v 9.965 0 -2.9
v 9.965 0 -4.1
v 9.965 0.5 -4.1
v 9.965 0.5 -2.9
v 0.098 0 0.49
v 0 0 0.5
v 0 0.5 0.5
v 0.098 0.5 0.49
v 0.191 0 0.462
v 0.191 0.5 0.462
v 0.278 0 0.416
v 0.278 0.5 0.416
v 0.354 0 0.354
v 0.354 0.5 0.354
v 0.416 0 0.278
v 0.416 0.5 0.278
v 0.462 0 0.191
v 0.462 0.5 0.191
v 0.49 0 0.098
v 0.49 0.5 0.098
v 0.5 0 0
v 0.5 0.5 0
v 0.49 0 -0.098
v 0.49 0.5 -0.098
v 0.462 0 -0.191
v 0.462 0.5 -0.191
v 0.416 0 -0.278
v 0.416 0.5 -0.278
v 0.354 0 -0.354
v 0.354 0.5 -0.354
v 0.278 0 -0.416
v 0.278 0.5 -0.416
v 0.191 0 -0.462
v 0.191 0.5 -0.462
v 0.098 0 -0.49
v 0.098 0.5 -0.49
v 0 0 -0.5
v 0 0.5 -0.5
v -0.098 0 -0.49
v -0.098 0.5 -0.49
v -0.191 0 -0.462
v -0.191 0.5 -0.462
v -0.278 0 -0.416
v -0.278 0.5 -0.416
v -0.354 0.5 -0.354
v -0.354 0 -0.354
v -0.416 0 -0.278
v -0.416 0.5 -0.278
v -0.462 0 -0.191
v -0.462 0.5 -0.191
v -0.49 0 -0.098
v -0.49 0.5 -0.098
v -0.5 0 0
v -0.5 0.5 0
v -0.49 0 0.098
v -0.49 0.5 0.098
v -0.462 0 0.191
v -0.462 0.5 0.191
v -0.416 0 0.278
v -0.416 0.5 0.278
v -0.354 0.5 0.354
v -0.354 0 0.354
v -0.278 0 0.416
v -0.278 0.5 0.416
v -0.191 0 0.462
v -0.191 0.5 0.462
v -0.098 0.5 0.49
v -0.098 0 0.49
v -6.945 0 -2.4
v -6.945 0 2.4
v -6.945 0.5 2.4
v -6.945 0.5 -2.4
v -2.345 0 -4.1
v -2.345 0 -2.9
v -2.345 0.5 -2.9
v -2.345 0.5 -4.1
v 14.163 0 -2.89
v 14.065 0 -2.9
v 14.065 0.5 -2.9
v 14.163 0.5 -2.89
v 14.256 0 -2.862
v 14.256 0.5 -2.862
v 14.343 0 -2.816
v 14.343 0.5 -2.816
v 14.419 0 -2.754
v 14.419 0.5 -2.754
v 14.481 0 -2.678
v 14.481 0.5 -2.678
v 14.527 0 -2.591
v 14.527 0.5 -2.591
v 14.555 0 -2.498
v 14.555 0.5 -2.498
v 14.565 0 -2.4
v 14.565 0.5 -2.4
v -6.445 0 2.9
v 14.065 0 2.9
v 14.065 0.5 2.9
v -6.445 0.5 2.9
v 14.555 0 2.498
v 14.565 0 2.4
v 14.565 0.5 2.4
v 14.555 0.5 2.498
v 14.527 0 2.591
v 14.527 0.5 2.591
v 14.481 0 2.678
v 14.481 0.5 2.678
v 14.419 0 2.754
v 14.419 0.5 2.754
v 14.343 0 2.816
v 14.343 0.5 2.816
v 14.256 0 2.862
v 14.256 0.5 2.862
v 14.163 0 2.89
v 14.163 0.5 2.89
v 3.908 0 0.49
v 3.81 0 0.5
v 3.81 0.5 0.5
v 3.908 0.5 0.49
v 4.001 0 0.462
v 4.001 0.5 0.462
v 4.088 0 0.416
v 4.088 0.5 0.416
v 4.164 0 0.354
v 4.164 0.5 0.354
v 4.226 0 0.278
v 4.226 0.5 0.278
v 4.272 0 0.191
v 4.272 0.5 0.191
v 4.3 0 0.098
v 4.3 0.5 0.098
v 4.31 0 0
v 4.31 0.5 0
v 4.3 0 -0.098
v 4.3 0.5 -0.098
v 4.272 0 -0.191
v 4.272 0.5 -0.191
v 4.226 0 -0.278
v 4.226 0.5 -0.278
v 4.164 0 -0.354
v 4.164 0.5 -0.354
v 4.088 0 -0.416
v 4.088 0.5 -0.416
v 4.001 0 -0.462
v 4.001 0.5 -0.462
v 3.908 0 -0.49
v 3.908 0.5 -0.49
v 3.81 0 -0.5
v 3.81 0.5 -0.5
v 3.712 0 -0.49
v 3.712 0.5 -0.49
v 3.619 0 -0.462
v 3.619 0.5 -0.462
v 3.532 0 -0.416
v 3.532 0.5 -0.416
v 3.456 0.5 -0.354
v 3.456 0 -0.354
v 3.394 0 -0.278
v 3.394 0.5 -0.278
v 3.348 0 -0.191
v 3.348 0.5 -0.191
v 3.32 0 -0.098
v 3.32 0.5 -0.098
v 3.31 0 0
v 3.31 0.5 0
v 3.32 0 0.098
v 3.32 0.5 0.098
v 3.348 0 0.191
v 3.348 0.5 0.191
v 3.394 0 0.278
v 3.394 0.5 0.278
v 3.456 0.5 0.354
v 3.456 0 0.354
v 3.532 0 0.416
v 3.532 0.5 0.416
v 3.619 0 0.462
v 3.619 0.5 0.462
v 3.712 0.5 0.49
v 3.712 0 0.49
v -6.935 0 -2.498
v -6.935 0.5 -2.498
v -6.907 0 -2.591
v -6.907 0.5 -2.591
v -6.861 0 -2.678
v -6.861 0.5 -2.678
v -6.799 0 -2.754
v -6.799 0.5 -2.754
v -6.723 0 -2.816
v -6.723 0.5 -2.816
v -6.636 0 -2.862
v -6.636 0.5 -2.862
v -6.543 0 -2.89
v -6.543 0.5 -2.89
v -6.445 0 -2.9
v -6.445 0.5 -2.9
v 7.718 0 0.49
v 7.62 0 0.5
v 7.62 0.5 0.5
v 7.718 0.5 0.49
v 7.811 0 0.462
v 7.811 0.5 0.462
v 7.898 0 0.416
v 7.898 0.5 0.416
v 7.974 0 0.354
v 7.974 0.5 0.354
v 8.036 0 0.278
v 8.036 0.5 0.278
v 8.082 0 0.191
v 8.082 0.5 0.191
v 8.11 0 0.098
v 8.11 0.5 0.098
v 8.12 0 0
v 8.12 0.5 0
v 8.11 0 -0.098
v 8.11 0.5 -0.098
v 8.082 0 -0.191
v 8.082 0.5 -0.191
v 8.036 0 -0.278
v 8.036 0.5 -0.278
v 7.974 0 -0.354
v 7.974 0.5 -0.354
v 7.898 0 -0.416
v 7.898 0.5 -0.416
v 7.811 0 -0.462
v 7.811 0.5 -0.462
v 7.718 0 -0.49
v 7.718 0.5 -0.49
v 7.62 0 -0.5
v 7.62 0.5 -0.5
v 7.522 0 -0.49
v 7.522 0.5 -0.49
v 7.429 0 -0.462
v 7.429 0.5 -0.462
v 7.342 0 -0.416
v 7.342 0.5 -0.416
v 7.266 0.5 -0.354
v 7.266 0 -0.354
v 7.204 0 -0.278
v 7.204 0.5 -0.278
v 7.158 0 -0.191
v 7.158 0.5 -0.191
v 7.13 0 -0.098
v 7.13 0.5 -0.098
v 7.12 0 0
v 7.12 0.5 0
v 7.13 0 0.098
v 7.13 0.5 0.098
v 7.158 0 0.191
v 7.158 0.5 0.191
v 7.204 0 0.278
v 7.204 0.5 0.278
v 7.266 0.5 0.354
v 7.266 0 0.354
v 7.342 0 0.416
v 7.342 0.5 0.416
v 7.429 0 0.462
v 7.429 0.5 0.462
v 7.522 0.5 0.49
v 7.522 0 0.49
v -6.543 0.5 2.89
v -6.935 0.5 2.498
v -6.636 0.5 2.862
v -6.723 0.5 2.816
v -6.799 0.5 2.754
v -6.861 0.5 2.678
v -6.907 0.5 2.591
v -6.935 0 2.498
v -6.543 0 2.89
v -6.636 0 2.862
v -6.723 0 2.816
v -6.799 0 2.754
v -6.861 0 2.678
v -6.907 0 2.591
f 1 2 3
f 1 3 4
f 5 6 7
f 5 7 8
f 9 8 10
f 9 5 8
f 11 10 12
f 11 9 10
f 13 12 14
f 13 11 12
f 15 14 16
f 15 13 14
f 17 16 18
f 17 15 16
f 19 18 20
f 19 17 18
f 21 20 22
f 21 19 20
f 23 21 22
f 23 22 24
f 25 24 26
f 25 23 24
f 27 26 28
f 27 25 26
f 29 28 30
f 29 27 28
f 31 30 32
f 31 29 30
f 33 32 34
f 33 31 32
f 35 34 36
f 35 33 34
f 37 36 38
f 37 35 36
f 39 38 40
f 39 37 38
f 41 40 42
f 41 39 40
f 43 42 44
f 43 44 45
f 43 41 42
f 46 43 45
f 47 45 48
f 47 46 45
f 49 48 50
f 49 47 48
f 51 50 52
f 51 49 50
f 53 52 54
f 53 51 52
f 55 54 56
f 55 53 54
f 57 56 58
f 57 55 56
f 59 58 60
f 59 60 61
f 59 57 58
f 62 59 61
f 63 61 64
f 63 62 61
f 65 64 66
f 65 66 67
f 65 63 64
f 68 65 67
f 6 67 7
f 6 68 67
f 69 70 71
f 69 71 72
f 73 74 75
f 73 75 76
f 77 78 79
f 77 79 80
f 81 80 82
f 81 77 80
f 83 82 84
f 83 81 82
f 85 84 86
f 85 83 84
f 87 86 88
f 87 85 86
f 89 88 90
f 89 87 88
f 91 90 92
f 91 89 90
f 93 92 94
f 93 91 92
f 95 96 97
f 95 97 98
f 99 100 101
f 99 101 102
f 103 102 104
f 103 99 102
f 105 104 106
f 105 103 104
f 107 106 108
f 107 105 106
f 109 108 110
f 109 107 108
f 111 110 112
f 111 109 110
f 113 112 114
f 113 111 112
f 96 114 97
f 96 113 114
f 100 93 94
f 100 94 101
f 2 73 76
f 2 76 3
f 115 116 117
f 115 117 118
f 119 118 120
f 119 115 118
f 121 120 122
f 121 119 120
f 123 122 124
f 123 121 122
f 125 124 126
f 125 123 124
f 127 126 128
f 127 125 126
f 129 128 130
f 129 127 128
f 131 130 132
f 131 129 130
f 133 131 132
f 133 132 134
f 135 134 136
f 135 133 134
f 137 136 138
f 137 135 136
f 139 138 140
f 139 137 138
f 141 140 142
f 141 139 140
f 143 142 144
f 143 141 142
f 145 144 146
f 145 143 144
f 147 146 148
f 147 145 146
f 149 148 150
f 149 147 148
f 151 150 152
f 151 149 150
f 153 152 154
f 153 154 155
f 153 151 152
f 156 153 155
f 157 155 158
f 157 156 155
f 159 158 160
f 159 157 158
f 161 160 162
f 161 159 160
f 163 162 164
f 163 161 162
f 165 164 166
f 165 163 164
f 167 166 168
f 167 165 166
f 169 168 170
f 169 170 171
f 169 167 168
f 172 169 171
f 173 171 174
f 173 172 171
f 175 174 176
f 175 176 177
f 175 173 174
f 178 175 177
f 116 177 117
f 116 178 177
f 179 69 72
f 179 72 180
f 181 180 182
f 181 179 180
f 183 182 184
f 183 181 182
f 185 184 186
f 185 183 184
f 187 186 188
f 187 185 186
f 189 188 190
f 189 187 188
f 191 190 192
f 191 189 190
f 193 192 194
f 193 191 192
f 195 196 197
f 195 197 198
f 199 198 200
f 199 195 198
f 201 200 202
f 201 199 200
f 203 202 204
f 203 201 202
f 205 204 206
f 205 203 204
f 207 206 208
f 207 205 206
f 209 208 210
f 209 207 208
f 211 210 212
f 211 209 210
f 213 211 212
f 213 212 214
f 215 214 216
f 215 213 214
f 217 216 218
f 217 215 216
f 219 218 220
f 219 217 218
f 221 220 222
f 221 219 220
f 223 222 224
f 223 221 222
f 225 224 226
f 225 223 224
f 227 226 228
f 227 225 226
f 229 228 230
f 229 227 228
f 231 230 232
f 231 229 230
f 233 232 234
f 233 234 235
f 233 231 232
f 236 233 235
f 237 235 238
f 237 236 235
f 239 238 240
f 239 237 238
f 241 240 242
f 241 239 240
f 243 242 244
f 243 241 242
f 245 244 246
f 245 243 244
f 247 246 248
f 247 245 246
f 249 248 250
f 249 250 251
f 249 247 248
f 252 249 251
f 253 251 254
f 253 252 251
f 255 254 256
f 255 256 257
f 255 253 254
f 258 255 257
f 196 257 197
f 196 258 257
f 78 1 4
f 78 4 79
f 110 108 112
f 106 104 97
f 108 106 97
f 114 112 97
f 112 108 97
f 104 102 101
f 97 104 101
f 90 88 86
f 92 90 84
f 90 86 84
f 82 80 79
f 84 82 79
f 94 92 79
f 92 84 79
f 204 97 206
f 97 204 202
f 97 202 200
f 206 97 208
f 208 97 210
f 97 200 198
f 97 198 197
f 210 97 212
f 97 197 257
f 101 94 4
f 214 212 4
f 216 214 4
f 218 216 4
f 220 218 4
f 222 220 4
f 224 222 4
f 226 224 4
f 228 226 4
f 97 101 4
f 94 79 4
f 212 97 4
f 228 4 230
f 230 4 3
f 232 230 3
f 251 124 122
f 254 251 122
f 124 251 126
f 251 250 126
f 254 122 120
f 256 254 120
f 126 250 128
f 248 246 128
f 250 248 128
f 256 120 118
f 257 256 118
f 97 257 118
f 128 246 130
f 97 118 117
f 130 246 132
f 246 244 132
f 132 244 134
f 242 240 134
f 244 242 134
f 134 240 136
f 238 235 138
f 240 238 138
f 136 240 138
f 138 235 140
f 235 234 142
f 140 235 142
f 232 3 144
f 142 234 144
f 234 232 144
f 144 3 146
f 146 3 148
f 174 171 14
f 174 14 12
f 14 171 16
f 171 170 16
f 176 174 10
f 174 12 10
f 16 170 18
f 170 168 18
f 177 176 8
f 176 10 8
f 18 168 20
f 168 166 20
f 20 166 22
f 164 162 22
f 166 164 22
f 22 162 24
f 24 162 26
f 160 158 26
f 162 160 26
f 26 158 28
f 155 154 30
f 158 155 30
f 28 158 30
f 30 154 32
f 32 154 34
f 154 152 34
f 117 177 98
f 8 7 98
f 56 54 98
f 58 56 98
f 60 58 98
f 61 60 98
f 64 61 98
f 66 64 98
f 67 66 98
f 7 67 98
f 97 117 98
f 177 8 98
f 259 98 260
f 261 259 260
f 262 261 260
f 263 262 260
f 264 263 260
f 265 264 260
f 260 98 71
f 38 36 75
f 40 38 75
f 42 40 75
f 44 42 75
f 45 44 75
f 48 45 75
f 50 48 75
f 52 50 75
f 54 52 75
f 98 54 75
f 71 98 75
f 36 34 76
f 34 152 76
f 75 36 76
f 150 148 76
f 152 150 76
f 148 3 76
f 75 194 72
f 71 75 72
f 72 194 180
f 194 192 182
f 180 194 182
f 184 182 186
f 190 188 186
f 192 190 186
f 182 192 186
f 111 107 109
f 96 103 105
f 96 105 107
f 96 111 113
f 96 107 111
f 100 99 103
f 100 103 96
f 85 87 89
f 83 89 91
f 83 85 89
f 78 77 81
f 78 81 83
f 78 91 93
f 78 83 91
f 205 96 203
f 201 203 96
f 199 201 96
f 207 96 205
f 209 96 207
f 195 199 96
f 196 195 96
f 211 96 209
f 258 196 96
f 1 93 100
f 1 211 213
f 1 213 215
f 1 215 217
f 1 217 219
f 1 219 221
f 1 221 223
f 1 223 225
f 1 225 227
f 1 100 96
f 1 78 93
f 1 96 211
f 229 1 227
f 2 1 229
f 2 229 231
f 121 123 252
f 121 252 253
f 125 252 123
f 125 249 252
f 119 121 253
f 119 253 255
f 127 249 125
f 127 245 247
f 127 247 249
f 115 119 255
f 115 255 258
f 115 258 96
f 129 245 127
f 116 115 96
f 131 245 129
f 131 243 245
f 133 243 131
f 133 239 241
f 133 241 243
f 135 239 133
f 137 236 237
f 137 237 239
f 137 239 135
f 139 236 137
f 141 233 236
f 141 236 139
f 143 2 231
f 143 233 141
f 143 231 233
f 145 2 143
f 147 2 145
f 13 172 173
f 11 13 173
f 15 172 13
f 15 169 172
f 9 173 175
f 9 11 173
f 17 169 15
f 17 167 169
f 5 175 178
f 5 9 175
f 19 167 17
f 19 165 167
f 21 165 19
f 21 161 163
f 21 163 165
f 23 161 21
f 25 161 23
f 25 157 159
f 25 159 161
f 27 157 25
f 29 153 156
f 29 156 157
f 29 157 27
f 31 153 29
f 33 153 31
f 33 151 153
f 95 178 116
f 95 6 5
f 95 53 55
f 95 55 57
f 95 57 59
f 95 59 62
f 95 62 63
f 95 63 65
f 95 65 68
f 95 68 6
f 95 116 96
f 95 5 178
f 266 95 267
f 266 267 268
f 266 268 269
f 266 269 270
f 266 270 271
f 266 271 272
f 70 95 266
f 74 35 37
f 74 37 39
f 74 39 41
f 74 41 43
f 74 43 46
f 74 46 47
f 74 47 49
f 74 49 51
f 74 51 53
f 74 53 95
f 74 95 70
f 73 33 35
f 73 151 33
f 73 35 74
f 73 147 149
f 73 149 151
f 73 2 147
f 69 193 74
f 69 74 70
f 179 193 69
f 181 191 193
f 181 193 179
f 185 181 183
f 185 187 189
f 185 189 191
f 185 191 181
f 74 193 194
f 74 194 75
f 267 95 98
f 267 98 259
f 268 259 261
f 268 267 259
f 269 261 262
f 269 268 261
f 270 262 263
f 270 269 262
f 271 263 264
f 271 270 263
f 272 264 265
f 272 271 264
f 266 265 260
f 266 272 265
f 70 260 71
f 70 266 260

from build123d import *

# Parameters (mm, degrees)
SKETCH1_R           = 0.5
BOSS_EXTRUDE1_DEPTH = 0.5


with BuildPart() as part:
    # Sketch1 → Boss-Extrude1 (new body)
    with BuildSketch(Plane(origin=(0, 0, 0), x_dir=(1, 0, 0), z_dir=(0, 1, 0))):
        with BuildLine():
            Line((9.965, 2.9), (14.065, 2.9))
            ThreePointArc((14.065, 2.9), (14.418553391, 2.753553391), (14.565, 2.4))
            Line((14.565, 2.4), (14.565, -2.4))
            ThreePointArc((14.565, -2.4), (14.418553391, -2.753553391), (14.065, -2.9))
            Line((14.065, -2.9), (-6.445, -2.9))
            ThreePointArc((-6.445, -2.9), (-6.798553391, -2.753553391), (-6.945, -2.4))
            Line((-6.945, -2.4), (-6.945, 2.4))
            ThreePointArc((-6.945, 2.4), (-6.798553391, 2.753553391), (-6.445, 2.9))
            Line((-6.445, 2.9), (-2.345, 2.9))
            Line((-2.345, 2.9), (-2.345, 4.1))
            Line((-2.345, 4.1), (9.965, 4.1))
            Line((9.965, 4.1), (9.965, 2.9))
        make_face()
        with Locations(Location((0, 0, 0), (0, 0, 270))):
            Circle(SKETCH1_R, mode=Mode.SUBTRACT)
        with Locations(Location((3.81, 0, 0), (0, 0, 270))):
            Circle(SKETCH1_R, mode=Mode.SUBTRACT)
        with Locations(Location((7.62, 0, 0), (0, 0, 270))):
            Circle(SKETCH1_R, mode=Mode.SUBTRACT)
    extrude(amount=BOSS_EXTRUDE1_DEPTH)


solid = part.part
